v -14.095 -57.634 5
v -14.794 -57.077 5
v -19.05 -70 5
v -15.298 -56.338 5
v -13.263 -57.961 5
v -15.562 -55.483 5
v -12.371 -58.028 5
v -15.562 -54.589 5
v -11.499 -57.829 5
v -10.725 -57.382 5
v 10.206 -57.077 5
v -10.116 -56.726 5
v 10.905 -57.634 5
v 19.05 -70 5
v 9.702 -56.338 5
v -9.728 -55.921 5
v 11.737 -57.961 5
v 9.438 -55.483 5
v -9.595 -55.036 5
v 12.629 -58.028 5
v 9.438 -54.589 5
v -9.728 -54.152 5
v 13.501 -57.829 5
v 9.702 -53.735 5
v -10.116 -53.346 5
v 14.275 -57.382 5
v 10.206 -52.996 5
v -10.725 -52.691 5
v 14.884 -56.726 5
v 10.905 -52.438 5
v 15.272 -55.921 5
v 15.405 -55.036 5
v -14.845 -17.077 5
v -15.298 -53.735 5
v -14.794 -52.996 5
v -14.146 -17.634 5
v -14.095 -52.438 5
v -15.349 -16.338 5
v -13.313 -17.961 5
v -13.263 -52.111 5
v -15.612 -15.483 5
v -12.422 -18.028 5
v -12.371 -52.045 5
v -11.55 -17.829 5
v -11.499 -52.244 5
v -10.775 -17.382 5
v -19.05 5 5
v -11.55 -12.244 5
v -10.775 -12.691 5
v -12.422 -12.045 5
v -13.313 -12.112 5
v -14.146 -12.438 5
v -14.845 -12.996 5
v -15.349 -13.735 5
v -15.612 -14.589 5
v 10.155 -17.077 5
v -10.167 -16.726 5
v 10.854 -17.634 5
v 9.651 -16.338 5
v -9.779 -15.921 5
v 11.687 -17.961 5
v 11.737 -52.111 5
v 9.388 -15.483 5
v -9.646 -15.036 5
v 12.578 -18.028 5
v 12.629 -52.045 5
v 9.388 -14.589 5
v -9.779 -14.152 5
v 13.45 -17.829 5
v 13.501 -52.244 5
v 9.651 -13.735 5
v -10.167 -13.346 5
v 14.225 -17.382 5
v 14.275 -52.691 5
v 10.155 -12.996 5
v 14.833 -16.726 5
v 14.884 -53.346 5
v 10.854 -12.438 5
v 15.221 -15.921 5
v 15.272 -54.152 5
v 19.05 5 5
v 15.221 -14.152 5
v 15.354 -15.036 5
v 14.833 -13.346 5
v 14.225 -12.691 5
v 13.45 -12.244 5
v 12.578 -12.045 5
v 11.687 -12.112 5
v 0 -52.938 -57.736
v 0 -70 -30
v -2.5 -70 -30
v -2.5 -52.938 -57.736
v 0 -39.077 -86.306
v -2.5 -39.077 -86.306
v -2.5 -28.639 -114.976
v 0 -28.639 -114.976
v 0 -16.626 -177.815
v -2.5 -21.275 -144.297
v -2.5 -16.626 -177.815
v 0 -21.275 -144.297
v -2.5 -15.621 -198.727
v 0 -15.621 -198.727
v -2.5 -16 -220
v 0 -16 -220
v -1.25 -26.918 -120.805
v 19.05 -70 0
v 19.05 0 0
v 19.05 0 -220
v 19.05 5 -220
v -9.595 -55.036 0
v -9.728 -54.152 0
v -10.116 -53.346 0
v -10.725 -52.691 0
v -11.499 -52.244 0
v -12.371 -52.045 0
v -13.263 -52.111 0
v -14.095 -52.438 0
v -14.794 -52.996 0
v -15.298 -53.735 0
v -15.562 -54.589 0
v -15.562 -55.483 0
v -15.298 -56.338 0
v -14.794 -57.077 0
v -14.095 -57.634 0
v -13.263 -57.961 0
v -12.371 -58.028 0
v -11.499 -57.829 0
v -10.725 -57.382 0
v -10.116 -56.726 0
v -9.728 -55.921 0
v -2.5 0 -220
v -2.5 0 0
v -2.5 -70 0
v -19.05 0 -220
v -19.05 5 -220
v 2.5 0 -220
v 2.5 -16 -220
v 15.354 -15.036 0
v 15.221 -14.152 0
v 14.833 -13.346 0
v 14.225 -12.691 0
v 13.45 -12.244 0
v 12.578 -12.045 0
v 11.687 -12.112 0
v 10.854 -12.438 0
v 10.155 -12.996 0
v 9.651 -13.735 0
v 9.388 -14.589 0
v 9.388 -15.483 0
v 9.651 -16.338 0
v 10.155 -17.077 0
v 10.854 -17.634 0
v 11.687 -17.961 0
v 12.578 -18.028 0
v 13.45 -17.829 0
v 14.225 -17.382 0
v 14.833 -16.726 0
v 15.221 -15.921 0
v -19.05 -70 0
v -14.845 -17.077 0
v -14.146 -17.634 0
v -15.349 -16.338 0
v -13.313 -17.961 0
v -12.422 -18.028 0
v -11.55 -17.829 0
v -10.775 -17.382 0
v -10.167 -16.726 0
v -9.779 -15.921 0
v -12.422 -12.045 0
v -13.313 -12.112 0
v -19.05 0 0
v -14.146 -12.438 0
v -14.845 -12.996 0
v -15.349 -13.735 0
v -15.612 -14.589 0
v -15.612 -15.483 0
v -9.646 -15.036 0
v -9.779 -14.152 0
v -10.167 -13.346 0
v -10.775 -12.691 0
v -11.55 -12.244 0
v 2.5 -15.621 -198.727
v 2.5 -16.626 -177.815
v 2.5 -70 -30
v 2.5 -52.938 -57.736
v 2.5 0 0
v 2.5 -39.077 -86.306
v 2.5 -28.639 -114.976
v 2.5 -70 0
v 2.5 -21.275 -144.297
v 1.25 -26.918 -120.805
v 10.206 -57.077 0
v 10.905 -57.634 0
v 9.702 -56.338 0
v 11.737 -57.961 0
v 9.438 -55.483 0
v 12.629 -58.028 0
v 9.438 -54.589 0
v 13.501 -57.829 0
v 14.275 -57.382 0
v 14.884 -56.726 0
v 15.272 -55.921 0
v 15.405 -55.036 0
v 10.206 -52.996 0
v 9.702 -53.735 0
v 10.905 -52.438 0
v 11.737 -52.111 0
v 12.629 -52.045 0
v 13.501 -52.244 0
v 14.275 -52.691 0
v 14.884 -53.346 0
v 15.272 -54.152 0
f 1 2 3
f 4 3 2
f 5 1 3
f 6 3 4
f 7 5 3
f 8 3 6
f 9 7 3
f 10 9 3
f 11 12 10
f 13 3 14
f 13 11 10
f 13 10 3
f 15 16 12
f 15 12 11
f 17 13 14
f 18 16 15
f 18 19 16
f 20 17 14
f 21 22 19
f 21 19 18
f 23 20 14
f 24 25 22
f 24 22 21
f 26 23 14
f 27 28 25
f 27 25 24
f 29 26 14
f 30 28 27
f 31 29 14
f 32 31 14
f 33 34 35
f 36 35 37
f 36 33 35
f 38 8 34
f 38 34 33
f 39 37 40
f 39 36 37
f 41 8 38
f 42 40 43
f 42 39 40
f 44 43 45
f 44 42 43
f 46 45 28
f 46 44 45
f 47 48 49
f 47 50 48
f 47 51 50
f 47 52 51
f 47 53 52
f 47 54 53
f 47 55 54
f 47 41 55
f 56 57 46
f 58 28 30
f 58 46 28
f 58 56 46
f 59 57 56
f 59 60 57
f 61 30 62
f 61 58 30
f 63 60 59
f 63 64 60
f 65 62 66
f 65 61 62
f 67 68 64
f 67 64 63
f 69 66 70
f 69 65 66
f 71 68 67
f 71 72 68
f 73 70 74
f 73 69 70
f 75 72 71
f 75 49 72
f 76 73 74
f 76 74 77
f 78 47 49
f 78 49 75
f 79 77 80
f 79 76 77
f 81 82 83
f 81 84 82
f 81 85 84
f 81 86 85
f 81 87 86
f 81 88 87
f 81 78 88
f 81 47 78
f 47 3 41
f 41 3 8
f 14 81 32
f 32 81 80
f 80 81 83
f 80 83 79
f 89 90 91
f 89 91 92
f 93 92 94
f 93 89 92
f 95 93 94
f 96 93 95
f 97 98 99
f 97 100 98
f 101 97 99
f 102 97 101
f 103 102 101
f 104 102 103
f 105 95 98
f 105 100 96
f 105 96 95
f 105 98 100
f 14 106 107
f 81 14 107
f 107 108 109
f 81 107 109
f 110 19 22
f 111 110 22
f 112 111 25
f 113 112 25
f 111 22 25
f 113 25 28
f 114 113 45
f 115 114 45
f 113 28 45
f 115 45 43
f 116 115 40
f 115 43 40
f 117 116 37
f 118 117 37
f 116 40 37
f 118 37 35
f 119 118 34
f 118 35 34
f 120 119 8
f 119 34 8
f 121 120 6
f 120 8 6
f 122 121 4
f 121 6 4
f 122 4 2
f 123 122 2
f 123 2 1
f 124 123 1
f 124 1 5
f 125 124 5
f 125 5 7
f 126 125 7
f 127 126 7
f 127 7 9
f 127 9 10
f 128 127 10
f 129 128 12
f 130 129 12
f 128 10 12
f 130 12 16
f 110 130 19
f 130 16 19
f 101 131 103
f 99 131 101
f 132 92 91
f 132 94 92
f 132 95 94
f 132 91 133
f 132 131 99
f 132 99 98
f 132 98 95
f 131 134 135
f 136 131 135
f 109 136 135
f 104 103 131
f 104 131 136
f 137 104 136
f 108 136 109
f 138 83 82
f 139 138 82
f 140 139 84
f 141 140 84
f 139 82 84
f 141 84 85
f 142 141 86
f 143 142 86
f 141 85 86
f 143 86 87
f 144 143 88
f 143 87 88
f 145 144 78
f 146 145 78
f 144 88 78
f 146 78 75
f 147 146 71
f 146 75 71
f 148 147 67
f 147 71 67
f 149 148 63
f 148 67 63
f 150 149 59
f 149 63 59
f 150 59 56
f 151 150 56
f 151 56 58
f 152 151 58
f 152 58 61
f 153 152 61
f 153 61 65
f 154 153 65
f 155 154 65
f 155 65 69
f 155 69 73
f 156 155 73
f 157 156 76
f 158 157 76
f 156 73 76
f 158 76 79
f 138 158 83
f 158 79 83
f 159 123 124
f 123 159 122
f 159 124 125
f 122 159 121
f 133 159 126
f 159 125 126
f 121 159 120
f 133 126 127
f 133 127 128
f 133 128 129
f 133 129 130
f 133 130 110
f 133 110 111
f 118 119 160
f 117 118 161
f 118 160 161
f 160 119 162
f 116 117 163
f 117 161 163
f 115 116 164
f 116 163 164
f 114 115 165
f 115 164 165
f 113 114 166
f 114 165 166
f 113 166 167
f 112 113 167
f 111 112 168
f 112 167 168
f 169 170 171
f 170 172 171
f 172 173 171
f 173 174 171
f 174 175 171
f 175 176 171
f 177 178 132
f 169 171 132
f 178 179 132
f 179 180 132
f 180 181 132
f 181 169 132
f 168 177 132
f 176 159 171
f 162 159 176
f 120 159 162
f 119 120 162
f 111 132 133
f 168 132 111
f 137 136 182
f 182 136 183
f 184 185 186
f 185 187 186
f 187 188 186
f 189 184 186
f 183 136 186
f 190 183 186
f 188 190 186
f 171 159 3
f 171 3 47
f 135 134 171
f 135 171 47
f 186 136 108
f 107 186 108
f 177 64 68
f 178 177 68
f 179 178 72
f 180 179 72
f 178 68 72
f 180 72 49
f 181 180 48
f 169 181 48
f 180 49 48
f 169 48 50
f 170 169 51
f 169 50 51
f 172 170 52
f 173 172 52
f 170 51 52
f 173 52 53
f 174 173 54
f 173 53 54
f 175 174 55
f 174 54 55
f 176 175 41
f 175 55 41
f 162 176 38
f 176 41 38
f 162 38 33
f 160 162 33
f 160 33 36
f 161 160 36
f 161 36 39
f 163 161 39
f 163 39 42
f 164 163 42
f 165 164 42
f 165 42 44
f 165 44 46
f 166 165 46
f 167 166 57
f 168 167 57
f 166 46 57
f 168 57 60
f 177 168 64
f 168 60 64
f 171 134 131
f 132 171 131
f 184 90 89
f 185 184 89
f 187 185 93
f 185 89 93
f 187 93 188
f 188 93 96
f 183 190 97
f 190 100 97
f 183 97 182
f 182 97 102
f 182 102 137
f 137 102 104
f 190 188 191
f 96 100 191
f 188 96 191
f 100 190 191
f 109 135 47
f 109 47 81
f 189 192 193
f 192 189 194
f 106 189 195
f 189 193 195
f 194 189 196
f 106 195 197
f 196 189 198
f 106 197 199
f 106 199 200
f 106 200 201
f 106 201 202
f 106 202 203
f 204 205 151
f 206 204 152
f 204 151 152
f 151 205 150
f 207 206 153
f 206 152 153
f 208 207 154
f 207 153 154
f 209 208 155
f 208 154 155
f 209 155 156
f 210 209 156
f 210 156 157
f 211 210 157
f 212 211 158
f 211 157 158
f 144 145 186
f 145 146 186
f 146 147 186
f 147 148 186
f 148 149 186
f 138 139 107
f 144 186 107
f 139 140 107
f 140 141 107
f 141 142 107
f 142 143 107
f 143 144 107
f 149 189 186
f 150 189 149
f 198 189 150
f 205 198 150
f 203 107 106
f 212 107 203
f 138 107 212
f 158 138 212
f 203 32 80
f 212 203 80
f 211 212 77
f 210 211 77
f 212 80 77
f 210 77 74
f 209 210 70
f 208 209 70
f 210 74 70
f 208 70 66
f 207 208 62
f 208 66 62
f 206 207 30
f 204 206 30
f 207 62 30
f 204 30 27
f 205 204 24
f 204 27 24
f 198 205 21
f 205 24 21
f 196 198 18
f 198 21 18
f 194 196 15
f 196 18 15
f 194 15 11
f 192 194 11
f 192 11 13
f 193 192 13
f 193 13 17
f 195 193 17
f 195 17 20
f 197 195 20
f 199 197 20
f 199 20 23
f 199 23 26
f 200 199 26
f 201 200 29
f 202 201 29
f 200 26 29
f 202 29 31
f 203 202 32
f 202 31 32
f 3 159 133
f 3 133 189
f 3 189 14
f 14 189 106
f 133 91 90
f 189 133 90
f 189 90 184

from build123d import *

# Parameters (mm, degrees)
SALIENTE_EXTRUIR1_DEPTH = 2.5
CROQUIS3_W              = 38.1
CROQUIS3_H              = 220
SALIENTE_EXTRUIR2_DEPTH = 5
CROQUIS4_W              = 38.1
CROQUIS4_H              = 75
SALIENTE_EXTRUIR3_DEPTH = 5
CROQUIS5_R              = 3
CORTAR_EXTRUIR1_DEPTH   = 5


with BuildPart() as part:
    # Croquis1 → Saliente-Extruir1 (new, symmetric)
    with BuildSketch(Plane(origin=(0, 0, 0), x_dir=(0, 0, -1), z_dir=(1, 0, 0))):
        with BuildLine():
            Line((0, 0), (220, 0))
            Line((220, 0), (220, -16))
            add(Edge.make_bspline(
                [(30, -70), (116.610221718, -10.835054956), (220, -16)],
                knots=[0, 0, 0, 1, 1, 1], degree=2))
            Line((30, -70), (0, -70))
            Line((0, -70), (0, 0))
        make_face()
    extrude(amount=SALIENTE_EXTRUIR1_DEPTH, both=True)

    # Croquis3 → Saliente-Extruir2 (add)
    with BuildSketch(Plane(origin=(0, 0, 0), x_dir=(1, 0, 0), z_dir=(0, 1, 0))):
        with Locations((0, 110)):
            Rectangle(CROQUIS3_W, CROQUIS3_H)
    extrude(amount=SALIENTE_EXTRUIR2_DEPTH)

    # Croquis4 → Saliente-Extruir3 (add)
    with BuildSketch(Plane.XY):
        with Locations((0, -32.5)):
            Rectangle(CROQUIS4_W, CROQUIS4_H)
    extrude(amount=SALIENTE_EXTRUIR3_DEPTH)

    # Croquis5 → Cortar-Extruir1 (cut)
    with BuildSketch(Plane.XY.offset(5)):
        with Locations((-12.645725933, -15.036309881)):
            Circle(CROQUIS5_R)
        with Locations((12.354274067, -15.036309881)):
            Circle(CROQUIS5_R)
        with Locations((-12.595015566, -55.036277737)):
            Circle(CROQUIS5_R)
        with Locations((12.404984434, -55.036277737)):
            Circle(CROQUIS5_R)
    extrude(amount=-CORTAR_EXTRUIR1_DEPTH, mode=Mode.SUBTRACT)


solid = part.part
